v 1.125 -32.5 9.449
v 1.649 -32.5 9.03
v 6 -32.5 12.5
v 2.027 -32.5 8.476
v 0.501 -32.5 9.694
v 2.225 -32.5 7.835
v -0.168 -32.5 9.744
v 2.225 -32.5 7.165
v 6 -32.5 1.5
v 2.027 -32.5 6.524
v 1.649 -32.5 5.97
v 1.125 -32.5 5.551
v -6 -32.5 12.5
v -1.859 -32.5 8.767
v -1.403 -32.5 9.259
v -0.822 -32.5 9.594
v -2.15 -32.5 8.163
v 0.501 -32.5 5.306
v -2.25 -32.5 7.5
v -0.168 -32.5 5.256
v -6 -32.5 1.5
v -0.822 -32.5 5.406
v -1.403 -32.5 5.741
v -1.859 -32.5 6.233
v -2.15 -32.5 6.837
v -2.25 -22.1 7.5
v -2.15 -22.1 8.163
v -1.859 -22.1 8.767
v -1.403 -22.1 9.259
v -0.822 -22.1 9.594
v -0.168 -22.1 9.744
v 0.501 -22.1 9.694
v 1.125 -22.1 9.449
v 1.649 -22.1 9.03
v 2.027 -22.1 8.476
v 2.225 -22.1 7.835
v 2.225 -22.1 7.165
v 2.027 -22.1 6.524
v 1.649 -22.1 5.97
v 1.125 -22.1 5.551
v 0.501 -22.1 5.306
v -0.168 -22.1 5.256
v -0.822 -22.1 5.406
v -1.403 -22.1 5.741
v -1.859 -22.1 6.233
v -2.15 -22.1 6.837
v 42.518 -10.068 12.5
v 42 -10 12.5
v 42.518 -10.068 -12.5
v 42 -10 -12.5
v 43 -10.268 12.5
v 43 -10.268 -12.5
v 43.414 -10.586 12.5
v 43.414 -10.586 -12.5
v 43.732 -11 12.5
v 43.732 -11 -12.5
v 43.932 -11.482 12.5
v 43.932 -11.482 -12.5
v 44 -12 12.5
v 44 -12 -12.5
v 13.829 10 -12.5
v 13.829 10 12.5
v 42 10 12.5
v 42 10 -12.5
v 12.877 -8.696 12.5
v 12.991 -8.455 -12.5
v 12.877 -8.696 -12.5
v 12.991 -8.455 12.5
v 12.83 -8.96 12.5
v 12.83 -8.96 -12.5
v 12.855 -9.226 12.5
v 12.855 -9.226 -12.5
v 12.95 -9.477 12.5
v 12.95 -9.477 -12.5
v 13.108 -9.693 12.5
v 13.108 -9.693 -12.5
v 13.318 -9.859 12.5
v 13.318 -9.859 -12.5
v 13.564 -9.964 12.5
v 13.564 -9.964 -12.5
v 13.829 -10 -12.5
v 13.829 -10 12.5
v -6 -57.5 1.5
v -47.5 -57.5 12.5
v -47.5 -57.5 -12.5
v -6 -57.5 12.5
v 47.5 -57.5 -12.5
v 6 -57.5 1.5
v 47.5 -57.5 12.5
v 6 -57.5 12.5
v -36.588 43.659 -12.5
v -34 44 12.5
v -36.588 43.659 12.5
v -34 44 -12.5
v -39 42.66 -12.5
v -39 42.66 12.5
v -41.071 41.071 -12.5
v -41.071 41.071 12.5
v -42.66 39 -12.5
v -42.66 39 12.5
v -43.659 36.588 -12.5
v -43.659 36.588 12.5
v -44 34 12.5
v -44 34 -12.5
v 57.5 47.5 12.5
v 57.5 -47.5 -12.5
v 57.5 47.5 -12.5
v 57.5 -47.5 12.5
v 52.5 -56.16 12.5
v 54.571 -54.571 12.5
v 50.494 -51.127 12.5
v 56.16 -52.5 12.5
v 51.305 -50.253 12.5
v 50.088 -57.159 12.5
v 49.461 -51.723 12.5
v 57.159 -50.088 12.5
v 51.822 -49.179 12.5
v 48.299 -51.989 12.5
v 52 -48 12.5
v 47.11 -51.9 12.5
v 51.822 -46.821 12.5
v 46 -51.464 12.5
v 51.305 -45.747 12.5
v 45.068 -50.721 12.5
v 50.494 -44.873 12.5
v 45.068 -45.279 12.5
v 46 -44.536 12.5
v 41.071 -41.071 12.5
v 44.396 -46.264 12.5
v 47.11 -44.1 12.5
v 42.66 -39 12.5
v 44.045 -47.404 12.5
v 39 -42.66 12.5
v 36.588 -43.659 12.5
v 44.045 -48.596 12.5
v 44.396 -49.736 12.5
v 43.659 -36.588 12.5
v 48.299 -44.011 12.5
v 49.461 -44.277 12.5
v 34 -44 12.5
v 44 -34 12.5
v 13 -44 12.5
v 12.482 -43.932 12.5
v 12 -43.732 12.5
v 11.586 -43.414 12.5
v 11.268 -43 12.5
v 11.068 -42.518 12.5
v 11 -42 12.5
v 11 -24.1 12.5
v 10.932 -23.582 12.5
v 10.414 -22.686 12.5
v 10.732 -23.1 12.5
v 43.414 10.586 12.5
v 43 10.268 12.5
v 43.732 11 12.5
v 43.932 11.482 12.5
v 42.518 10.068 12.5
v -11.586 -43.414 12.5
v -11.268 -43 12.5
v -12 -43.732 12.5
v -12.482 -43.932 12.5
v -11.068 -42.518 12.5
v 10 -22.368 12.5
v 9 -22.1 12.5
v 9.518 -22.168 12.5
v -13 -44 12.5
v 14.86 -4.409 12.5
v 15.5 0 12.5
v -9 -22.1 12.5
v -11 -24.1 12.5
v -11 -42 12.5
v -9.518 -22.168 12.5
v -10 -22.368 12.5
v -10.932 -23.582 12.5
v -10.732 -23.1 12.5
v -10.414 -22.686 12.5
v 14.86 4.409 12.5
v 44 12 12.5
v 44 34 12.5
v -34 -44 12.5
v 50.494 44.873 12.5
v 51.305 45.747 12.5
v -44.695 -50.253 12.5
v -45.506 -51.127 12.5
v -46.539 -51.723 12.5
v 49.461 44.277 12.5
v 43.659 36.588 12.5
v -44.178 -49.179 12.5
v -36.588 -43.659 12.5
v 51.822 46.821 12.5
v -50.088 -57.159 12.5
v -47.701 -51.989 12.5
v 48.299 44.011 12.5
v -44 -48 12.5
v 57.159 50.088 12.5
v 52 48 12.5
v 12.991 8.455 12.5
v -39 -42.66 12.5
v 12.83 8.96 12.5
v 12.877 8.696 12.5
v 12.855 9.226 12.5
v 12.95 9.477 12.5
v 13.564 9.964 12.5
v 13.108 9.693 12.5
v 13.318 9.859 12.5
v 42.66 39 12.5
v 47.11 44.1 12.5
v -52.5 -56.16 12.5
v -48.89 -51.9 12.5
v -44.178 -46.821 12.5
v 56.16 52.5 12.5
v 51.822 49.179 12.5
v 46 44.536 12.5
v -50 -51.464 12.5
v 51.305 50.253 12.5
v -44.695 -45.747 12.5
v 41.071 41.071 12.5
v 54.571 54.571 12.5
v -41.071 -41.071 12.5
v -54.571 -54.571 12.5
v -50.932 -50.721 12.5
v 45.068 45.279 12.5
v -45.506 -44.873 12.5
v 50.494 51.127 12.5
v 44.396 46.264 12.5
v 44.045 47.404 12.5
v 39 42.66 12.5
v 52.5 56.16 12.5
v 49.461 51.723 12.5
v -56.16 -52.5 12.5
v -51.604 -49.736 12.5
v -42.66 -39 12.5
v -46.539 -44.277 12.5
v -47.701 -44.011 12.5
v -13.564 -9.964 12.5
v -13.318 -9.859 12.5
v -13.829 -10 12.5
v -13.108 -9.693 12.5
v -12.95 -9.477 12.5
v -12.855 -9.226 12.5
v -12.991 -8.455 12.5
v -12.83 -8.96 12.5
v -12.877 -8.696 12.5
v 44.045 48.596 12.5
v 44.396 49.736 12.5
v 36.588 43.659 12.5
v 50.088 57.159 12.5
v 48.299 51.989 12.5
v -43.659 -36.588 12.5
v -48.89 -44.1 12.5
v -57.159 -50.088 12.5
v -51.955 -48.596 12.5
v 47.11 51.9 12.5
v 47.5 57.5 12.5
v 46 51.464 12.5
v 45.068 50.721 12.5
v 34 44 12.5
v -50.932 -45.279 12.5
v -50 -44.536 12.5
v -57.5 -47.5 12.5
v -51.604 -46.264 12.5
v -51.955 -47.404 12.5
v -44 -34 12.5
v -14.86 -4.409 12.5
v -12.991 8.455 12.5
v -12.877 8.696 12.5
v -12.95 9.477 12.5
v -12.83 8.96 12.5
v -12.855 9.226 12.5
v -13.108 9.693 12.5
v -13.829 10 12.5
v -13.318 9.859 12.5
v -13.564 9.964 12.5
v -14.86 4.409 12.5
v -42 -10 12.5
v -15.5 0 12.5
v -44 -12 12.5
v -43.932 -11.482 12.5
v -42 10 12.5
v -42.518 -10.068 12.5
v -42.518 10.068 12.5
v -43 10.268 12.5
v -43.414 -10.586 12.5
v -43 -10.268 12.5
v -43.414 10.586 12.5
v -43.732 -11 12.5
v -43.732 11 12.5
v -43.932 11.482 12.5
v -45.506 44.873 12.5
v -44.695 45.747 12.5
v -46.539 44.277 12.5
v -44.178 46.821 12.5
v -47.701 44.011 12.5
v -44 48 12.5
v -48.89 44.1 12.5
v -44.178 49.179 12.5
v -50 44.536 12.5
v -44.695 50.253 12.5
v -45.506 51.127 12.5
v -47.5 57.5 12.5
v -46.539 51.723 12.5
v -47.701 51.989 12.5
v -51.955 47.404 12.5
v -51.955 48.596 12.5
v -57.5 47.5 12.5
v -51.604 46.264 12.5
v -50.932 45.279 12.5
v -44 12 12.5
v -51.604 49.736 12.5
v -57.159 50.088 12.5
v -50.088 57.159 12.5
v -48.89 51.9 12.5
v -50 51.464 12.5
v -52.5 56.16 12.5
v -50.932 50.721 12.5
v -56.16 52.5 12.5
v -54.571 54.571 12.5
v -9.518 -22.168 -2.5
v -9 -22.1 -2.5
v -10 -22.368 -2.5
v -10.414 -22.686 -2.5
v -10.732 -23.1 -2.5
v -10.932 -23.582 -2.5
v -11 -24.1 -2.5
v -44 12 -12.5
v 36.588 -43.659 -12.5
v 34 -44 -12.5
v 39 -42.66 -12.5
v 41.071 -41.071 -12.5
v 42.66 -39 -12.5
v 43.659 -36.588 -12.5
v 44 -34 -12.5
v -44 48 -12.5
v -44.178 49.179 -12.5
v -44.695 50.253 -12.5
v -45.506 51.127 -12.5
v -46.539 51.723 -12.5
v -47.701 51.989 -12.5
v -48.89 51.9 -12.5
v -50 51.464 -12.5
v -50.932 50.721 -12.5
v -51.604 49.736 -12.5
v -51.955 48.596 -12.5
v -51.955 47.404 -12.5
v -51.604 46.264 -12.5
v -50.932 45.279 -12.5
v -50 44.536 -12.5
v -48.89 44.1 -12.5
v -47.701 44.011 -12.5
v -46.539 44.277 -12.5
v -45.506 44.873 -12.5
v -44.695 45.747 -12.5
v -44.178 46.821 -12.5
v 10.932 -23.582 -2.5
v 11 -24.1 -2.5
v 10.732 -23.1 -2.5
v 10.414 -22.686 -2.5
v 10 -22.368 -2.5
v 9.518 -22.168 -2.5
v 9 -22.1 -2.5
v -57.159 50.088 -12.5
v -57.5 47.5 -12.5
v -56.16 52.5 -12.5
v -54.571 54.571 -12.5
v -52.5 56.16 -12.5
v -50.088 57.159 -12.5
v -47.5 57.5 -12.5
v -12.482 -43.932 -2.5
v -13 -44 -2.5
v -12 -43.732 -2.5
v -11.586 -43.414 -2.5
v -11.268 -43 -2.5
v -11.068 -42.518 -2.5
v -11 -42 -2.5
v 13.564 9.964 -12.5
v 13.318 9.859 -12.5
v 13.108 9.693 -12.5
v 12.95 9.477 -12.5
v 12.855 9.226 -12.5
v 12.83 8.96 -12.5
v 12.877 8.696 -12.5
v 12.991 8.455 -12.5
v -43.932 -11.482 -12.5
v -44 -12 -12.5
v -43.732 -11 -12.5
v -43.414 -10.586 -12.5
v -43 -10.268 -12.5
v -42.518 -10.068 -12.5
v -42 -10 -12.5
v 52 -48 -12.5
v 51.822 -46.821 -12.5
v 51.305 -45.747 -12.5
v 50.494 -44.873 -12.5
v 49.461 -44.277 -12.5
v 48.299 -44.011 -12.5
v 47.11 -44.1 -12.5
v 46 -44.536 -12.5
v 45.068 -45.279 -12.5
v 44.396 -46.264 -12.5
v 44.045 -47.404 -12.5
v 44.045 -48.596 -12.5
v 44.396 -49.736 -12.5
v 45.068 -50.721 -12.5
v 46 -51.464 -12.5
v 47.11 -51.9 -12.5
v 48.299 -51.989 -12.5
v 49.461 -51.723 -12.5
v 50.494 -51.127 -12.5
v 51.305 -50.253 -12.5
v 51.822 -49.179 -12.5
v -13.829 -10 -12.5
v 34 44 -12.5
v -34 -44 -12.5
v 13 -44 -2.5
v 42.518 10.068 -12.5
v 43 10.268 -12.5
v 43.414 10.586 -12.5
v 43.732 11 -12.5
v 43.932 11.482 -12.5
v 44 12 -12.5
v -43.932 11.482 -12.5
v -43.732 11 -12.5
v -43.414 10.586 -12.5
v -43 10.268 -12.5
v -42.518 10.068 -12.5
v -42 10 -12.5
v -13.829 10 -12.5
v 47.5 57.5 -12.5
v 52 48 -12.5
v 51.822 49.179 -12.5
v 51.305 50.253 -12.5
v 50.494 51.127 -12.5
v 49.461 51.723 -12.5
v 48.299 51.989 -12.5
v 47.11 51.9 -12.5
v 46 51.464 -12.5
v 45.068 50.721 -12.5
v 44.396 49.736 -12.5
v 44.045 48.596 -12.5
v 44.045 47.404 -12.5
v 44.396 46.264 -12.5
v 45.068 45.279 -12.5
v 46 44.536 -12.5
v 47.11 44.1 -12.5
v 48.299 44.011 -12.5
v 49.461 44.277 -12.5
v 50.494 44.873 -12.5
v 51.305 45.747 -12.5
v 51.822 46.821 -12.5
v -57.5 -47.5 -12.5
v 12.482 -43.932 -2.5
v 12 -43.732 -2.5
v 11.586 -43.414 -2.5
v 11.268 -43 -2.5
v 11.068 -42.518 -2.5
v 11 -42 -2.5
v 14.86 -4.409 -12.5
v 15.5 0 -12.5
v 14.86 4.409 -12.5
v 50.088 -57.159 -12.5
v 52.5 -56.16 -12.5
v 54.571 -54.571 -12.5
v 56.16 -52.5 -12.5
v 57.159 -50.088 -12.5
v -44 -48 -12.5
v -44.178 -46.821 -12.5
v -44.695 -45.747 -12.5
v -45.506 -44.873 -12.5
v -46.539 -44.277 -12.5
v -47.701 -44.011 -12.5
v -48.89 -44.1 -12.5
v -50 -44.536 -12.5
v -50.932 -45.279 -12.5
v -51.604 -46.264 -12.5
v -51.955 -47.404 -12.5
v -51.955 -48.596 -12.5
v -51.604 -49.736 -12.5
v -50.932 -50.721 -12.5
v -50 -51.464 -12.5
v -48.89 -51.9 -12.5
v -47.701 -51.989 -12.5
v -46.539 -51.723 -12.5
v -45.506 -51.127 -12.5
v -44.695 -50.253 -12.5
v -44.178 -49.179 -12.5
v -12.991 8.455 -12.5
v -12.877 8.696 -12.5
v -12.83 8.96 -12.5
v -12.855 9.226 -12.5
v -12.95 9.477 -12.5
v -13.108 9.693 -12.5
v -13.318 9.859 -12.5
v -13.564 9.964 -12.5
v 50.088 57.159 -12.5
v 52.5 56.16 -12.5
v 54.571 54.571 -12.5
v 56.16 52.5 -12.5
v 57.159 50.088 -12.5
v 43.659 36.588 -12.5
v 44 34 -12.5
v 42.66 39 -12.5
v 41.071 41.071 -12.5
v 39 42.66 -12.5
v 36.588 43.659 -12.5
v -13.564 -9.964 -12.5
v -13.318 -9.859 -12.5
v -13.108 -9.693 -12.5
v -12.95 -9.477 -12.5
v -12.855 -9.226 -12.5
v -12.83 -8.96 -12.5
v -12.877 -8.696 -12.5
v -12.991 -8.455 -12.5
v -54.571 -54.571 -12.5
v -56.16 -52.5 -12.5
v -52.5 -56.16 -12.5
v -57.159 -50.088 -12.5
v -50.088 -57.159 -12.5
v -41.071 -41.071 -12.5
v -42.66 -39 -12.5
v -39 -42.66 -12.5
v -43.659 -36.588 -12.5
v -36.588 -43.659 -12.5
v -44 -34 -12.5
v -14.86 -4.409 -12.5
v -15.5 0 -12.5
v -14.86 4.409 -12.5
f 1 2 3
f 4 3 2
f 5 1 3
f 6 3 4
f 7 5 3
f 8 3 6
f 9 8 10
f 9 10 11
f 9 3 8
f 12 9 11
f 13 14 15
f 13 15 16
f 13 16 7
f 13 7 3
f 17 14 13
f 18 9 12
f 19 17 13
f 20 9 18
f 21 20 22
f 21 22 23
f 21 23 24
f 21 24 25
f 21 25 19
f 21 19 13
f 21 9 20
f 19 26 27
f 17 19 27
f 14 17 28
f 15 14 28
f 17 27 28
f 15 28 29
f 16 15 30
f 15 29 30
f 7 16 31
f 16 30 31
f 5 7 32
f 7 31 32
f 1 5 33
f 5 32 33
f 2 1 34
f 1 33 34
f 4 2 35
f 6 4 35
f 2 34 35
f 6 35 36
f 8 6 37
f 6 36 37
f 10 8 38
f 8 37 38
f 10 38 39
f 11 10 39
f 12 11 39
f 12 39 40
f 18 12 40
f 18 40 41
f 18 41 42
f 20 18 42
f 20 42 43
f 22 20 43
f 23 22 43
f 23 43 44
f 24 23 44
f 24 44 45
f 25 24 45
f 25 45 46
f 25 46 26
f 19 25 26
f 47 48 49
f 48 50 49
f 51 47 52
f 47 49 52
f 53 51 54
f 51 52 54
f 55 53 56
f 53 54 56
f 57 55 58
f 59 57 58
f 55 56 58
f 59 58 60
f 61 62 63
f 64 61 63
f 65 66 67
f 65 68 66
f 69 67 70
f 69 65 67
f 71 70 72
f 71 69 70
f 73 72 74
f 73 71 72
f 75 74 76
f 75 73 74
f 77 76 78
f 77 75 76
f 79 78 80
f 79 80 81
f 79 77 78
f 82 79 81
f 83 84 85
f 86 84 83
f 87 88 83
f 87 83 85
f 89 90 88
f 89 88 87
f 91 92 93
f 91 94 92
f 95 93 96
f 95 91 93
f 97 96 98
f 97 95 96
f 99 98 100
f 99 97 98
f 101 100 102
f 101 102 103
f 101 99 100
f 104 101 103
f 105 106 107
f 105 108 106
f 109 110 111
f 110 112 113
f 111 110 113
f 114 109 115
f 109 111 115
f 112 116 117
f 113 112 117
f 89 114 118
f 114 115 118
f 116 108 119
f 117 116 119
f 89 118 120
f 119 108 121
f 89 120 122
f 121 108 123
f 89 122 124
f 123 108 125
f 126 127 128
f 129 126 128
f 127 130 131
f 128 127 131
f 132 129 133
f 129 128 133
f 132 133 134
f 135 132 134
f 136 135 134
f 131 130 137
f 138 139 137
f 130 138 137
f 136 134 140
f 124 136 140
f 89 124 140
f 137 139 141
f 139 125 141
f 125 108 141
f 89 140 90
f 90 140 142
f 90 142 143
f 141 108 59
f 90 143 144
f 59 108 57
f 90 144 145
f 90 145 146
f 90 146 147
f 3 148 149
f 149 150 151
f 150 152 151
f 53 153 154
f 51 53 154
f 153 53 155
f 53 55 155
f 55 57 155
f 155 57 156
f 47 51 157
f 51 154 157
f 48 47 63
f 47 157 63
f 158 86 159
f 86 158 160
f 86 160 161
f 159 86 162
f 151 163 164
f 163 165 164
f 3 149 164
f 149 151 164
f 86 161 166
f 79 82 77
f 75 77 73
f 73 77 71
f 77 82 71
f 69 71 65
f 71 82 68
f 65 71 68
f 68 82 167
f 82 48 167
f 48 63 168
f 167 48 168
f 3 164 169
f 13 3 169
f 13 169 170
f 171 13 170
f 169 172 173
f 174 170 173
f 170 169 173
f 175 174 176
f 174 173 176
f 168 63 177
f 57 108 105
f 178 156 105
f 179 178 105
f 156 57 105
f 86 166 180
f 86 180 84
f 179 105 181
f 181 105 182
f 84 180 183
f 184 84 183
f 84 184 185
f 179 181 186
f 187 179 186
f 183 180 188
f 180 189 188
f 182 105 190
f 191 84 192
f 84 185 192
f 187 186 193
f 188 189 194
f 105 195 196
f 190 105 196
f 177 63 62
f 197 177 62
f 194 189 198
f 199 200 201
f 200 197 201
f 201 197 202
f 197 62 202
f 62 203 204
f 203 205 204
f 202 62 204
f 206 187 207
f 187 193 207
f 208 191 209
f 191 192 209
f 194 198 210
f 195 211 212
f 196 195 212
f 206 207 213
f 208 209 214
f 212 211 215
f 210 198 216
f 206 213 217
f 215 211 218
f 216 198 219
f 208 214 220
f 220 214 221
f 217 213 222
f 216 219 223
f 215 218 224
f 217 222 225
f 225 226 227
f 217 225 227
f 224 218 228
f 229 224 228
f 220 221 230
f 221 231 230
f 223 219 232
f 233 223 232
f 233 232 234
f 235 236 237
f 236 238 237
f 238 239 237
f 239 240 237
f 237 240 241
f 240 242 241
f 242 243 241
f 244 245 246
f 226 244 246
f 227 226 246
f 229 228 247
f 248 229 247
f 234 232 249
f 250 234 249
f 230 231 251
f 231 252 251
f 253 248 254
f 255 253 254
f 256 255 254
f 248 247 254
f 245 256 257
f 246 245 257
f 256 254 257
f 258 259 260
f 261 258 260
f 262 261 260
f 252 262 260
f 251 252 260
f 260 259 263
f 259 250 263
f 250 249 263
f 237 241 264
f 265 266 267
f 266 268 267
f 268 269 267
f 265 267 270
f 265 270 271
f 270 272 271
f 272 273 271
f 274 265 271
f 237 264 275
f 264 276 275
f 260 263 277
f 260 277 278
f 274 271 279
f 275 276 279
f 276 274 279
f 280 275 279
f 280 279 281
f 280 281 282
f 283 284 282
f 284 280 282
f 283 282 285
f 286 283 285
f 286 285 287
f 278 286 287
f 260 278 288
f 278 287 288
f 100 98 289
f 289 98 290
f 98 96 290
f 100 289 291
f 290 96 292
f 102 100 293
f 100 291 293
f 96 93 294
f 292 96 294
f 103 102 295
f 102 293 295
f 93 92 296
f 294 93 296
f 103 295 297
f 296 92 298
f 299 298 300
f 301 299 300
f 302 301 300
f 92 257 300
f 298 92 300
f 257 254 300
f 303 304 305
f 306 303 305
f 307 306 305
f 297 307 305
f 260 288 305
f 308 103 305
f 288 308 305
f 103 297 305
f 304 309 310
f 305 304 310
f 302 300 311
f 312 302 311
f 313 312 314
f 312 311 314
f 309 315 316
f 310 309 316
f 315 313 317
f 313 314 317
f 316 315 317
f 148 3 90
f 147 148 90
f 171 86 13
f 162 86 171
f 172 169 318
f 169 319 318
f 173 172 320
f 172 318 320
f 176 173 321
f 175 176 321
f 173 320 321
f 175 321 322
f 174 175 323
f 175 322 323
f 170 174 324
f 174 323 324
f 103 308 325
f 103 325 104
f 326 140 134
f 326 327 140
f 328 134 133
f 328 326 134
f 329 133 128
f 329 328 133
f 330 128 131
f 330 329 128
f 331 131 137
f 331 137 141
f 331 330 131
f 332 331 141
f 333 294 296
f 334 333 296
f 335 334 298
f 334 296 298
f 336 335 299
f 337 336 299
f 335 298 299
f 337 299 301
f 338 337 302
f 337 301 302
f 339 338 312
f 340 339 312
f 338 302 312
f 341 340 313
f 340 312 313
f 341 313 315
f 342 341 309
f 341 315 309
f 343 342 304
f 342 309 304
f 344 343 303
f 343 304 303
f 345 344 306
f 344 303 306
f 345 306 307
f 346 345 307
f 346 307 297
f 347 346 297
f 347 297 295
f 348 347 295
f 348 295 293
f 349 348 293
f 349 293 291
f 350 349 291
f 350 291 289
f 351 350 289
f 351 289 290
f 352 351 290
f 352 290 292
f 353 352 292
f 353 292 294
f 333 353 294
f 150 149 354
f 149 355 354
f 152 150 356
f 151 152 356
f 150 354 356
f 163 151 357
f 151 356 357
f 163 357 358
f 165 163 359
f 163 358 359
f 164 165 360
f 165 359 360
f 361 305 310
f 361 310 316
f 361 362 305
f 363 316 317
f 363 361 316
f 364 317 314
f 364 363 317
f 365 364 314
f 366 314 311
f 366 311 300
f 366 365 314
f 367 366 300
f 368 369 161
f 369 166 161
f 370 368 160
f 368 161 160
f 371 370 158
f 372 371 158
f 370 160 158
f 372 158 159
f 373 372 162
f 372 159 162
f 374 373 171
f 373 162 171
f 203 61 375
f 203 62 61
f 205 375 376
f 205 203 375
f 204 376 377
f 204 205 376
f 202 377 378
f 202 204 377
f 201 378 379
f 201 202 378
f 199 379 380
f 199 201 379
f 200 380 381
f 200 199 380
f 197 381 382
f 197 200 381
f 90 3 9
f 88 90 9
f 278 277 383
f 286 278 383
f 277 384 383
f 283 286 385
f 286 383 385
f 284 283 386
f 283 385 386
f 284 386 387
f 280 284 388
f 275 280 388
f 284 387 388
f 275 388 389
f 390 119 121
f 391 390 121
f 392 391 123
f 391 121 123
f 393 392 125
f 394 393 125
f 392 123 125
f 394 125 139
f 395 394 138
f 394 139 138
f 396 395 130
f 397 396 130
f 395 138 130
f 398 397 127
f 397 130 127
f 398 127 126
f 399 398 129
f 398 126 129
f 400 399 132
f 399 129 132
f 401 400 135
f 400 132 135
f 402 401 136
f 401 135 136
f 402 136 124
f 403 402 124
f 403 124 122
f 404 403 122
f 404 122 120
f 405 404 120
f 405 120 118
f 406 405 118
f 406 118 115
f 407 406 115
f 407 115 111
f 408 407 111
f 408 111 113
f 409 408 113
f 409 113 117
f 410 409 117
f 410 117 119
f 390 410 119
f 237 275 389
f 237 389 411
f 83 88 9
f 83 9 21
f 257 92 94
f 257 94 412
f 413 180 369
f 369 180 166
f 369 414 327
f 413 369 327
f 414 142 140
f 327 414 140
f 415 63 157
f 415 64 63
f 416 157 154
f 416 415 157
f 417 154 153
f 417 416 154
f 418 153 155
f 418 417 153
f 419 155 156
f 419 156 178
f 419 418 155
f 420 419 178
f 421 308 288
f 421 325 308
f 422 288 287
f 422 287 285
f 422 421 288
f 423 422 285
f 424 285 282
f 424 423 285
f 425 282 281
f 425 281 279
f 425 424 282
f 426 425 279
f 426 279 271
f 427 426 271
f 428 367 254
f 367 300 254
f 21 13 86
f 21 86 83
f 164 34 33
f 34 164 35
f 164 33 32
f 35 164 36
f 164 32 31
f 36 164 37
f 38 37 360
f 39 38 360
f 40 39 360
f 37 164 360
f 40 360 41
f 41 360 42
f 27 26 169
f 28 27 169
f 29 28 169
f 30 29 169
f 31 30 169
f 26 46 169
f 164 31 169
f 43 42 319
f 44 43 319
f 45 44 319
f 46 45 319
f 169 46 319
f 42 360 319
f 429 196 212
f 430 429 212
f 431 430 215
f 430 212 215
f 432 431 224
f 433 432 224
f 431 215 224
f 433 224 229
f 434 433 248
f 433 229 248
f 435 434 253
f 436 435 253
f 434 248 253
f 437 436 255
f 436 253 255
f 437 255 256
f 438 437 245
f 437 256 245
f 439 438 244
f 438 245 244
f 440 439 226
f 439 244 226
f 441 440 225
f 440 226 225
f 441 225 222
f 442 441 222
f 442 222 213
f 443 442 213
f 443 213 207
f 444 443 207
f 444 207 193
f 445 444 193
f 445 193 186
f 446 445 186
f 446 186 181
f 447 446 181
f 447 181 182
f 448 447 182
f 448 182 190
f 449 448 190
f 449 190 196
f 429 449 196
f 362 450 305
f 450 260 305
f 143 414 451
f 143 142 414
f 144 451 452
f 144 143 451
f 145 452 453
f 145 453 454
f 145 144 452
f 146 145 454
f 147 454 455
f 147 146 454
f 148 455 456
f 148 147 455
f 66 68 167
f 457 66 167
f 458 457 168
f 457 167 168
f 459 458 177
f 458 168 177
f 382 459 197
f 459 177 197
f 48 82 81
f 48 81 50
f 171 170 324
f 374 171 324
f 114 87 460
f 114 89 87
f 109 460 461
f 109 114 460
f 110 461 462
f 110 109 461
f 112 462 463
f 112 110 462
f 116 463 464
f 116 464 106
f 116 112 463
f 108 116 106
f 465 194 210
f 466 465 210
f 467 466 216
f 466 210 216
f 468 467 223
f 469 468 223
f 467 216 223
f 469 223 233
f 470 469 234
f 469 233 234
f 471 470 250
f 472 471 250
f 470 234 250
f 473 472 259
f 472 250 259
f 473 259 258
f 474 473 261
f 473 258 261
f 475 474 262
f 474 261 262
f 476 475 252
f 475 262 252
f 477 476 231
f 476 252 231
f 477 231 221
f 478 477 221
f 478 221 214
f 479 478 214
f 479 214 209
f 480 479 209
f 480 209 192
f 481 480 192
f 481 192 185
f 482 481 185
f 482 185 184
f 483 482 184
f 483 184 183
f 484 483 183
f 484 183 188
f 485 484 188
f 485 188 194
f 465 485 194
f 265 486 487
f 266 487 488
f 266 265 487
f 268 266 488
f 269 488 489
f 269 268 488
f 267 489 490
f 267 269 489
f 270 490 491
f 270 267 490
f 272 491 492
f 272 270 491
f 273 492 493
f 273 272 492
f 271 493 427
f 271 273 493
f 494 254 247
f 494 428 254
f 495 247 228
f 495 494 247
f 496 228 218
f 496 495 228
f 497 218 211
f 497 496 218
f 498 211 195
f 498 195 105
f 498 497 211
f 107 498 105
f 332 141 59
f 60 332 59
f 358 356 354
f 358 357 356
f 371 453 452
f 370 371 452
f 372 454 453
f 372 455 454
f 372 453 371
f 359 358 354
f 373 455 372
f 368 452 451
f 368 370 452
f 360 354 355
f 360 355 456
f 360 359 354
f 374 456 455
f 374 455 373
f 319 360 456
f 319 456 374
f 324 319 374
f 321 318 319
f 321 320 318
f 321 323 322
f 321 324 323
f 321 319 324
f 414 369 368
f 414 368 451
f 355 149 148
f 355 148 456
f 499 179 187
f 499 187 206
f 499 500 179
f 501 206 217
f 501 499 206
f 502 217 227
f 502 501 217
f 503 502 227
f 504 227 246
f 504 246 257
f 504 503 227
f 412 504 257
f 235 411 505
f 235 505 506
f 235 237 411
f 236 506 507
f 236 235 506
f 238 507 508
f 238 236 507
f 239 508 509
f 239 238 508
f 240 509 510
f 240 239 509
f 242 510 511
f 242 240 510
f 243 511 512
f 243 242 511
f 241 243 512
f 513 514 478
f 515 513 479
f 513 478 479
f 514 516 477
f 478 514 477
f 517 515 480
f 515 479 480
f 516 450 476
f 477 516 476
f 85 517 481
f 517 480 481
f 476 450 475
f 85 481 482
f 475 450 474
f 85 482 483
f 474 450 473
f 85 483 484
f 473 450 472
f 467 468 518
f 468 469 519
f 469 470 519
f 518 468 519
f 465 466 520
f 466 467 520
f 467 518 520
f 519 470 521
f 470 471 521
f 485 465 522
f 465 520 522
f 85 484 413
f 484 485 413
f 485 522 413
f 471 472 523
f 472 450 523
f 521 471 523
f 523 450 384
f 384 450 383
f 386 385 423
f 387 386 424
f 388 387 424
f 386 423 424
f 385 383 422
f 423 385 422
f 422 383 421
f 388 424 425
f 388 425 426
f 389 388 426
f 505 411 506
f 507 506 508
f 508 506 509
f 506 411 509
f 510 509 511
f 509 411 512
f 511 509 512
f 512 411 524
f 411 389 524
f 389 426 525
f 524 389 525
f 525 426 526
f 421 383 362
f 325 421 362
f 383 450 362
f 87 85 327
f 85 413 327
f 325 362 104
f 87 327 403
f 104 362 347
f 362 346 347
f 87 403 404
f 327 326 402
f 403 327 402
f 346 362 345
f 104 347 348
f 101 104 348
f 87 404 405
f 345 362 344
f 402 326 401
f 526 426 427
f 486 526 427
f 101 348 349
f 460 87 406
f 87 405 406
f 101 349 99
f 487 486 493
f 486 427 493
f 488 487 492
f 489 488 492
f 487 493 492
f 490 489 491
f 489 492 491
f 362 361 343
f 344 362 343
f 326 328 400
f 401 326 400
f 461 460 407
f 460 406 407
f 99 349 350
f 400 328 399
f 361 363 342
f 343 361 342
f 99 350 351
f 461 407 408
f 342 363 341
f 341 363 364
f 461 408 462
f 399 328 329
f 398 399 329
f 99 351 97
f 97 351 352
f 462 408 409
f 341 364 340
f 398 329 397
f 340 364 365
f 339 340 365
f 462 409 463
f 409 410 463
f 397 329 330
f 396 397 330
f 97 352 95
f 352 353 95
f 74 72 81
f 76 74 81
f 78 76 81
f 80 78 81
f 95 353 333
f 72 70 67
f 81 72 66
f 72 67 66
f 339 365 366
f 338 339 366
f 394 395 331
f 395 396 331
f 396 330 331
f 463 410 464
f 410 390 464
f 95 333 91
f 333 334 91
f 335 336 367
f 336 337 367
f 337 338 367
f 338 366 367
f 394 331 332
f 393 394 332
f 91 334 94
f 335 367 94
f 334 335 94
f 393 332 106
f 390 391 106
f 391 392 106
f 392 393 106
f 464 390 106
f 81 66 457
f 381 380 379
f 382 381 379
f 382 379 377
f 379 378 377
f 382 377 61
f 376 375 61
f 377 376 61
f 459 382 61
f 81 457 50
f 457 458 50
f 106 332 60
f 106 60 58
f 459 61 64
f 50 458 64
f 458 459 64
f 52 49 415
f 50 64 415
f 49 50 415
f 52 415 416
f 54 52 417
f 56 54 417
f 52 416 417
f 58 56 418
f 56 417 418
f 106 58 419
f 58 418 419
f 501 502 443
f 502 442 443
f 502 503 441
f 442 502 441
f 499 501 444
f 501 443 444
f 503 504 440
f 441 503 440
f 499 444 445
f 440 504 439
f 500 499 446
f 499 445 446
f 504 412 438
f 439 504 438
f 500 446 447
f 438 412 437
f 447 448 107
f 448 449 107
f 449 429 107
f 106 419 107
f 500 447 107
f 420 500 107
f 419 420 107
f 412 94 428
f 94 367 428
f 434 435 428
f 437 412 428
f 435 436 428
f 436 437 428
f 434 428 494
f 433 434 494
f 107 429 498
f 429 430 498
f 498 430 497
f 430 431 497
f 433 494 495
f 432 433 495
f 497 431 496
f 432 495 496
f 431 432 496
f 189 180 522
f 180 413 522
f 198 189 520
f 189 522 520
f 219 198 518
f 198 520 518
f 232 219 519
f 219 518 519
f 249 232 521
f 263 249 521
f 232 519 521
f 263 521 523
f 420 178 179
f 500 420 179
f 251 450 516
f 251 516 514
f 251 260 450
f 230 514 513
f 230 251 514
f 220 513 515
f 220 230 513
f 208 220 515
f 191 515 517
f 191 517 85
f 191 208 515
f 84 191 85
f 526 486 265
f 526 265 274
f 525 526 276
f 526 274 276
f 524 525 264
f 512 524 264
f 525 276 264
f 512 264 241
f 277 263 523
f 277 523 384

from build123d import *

# Parameters (mm, degrees)
SKETCH1_W           = 115
SKETCH1_H           = 115
BOSS_EXTRUDE1_DEPTH = 12.5
SKETCH2_R           = 4
CUT_EXTRUDE1_DEPTH  = 30
FILLET1_R           = 10
SKETCH5_W           = 88
SKETCH5_H           = 88
CUT_EXTRUDE3_DEPTH  = 30
FILLET4_R           = 10
SKETCH6_W           = 88
SKETCH6_H           = 20
BOSS_EXTRUDE2_DEPTH = 25
SKETCH14_W          = 22
SKETCH14_H          = 15
BOSS_EXTRUDE6_DEPTH = 30
SKETCH16_R          = 15.5
CUT_EXTRUDE7_DEPTH  = 30
FILLET6_R           = 1
FILLET8_R           = 2
SKETCH17_R          = 2.25
CUT_EXTRUDE8_DEPTH  = 40
SKETCH18_W          = 12
SKETCH18_H          = 12
CUT_EXTRUDE9_DEPTH  = 25


with BuildPart() as part:
    # Sketch1 → Boss-Extrude1 (new, symmetric)
    with BuildSketch(Plane.XY):
        Rectangle(SKETCH1_W, SKETCH1_H)
    extrude(amount=BOSS_EXTRUDE1_DEPTH, both=True)

    # Sketch2 → Cut-Extrude1 (cut)
    with BuildSketch(Plane.XY.offset(12.5)):
        with Locations((-48, 48)):
            Circle(SKETCH2_R)
        with Locations((48, 48)):
            Circle(SKETCH2_R)
        with Locations((48, -48)):
            Circle(SKETCH2_R)
        with Locations((-48, -48)):
            Circle(SKETCH2_R)
    extrude(amount=-CUT_EXTRUDE1_DEPTH, mode=Mode.SUBTRACT)

    # Fillet1
    fillet1_edges = [part.edges().sort_by_distance(p)[0] for p in [
        (-57.5, 57.5, 0),
        (57.5, 57.5, 0),
        (57.5, -57.5, 0),
        (-57.5, -57.5, 0),
    ]]
    fillet(fillet1_edges, radius=FILLET1_R)

    # Sketch5 → Cut-Extrude3 (cut)
    with BuildSketch(Plane.XY.offset(12.5)):
        Rectangle(SKETCH5_W, SKETCH5_H)
    extrude(amount=-CUT_EXTRUDE3_DEPTH, mode=Mode.SUBTRACT)

    # Fillet4
    fillet4_edges = [part.edges().sort_by_distance(p)[0] for p in [
        (-44, -44, 0),
        (-44, 44, 0),
        (44, 44, 0),
        (44, -44, 0),
    ]]
    fillet(fillet4_edges, radius=FILLET4_R)

    # Sketch6 → Boss-Extrude2 (add)
    with BuildSketch(Plane.XY.offset(12.5)):
        Rectangle(SKETCH6_W, SKETCH6_H)
    extrude(amount=-BOSS_EXTRUDE2_DEPTH)

    # Sketch14 → Boss-Extrude6 (add)
    with BuildSketch(Plane(origin=(0, -22.1, 0), x_dir=(-1, 0, 0), z_dir=(0, -1, 0))):
        with Locations((0, -5)):
            Rectangle(SKETCH14_W, SKETCH14_H)
    extrude(amount=BOSS_EXTRUDE6_DEPTH)

    # Sketch16 → Cut-Extrude7 (cut)
    with BuildSketch(Plane.XY.offset(12.5)):
        Circle(SKETCH16_R)
    extrude(amount=-CUT_EXTRUDE7_DEPTH, mode=Mode.SUBTRACT)

    # Fillet6
    fillet6_edges = [part.edges().sort_by_distance(p)[0] for p in [
        (-11.842719282, -10, 0),
        (11.842719282, -10, 0),
        (11.842719282, 10, 0),
        (-11.842719282, 10, 0),
    ]]
    fillet(fillet6_edges, radius=FILLET6_R)

    # Fillet8
    fillet8_edges = [part.edges().sort_by_distance(p)[0] for p in [
        (-44, -10, 0),
        (-44, 10, 0),
        (44, 10, 0),
        (44, -10, 0),
        (-11, -44, 5),
        (11, -44, 5),
        (11, -22.1, 5),
        (-11, -22.1, 5),
    ]]
    fillet(fillet8_edges, radius=FILLET8_R)

    # Sketch17 → Cut-Extrude8 (cut)
    with BuildSketch(Plane(origin=(0, -22.1, 0), x_dir=(1, 0, 0), z_dir=(0, 1, 0))):
        with Locations(Location((0, -7.5, 0), (0, 0, 180))):
            Circle(SKETCH17_R)
    extrude(amount=-CUT_EXTRUDE8_DEPTH, mode=Mode.SUBTRACT)

    # Sketch18 → Cut-Extrude9 (cut)
    with BuildSketch(Plane(origin=(0, -57.5, 0), x_dir=(-1, 0, 0), z_dir=(0, -1, 0))):
        with Locations((0, -7.5)):
            Rectangle(SKETCH18_W, SKETCH18_H)
    extrude(amount=-CUT_EXTRUDE9_DEPTH, mode=Mode.SUBTRACT)


solid = part.part
